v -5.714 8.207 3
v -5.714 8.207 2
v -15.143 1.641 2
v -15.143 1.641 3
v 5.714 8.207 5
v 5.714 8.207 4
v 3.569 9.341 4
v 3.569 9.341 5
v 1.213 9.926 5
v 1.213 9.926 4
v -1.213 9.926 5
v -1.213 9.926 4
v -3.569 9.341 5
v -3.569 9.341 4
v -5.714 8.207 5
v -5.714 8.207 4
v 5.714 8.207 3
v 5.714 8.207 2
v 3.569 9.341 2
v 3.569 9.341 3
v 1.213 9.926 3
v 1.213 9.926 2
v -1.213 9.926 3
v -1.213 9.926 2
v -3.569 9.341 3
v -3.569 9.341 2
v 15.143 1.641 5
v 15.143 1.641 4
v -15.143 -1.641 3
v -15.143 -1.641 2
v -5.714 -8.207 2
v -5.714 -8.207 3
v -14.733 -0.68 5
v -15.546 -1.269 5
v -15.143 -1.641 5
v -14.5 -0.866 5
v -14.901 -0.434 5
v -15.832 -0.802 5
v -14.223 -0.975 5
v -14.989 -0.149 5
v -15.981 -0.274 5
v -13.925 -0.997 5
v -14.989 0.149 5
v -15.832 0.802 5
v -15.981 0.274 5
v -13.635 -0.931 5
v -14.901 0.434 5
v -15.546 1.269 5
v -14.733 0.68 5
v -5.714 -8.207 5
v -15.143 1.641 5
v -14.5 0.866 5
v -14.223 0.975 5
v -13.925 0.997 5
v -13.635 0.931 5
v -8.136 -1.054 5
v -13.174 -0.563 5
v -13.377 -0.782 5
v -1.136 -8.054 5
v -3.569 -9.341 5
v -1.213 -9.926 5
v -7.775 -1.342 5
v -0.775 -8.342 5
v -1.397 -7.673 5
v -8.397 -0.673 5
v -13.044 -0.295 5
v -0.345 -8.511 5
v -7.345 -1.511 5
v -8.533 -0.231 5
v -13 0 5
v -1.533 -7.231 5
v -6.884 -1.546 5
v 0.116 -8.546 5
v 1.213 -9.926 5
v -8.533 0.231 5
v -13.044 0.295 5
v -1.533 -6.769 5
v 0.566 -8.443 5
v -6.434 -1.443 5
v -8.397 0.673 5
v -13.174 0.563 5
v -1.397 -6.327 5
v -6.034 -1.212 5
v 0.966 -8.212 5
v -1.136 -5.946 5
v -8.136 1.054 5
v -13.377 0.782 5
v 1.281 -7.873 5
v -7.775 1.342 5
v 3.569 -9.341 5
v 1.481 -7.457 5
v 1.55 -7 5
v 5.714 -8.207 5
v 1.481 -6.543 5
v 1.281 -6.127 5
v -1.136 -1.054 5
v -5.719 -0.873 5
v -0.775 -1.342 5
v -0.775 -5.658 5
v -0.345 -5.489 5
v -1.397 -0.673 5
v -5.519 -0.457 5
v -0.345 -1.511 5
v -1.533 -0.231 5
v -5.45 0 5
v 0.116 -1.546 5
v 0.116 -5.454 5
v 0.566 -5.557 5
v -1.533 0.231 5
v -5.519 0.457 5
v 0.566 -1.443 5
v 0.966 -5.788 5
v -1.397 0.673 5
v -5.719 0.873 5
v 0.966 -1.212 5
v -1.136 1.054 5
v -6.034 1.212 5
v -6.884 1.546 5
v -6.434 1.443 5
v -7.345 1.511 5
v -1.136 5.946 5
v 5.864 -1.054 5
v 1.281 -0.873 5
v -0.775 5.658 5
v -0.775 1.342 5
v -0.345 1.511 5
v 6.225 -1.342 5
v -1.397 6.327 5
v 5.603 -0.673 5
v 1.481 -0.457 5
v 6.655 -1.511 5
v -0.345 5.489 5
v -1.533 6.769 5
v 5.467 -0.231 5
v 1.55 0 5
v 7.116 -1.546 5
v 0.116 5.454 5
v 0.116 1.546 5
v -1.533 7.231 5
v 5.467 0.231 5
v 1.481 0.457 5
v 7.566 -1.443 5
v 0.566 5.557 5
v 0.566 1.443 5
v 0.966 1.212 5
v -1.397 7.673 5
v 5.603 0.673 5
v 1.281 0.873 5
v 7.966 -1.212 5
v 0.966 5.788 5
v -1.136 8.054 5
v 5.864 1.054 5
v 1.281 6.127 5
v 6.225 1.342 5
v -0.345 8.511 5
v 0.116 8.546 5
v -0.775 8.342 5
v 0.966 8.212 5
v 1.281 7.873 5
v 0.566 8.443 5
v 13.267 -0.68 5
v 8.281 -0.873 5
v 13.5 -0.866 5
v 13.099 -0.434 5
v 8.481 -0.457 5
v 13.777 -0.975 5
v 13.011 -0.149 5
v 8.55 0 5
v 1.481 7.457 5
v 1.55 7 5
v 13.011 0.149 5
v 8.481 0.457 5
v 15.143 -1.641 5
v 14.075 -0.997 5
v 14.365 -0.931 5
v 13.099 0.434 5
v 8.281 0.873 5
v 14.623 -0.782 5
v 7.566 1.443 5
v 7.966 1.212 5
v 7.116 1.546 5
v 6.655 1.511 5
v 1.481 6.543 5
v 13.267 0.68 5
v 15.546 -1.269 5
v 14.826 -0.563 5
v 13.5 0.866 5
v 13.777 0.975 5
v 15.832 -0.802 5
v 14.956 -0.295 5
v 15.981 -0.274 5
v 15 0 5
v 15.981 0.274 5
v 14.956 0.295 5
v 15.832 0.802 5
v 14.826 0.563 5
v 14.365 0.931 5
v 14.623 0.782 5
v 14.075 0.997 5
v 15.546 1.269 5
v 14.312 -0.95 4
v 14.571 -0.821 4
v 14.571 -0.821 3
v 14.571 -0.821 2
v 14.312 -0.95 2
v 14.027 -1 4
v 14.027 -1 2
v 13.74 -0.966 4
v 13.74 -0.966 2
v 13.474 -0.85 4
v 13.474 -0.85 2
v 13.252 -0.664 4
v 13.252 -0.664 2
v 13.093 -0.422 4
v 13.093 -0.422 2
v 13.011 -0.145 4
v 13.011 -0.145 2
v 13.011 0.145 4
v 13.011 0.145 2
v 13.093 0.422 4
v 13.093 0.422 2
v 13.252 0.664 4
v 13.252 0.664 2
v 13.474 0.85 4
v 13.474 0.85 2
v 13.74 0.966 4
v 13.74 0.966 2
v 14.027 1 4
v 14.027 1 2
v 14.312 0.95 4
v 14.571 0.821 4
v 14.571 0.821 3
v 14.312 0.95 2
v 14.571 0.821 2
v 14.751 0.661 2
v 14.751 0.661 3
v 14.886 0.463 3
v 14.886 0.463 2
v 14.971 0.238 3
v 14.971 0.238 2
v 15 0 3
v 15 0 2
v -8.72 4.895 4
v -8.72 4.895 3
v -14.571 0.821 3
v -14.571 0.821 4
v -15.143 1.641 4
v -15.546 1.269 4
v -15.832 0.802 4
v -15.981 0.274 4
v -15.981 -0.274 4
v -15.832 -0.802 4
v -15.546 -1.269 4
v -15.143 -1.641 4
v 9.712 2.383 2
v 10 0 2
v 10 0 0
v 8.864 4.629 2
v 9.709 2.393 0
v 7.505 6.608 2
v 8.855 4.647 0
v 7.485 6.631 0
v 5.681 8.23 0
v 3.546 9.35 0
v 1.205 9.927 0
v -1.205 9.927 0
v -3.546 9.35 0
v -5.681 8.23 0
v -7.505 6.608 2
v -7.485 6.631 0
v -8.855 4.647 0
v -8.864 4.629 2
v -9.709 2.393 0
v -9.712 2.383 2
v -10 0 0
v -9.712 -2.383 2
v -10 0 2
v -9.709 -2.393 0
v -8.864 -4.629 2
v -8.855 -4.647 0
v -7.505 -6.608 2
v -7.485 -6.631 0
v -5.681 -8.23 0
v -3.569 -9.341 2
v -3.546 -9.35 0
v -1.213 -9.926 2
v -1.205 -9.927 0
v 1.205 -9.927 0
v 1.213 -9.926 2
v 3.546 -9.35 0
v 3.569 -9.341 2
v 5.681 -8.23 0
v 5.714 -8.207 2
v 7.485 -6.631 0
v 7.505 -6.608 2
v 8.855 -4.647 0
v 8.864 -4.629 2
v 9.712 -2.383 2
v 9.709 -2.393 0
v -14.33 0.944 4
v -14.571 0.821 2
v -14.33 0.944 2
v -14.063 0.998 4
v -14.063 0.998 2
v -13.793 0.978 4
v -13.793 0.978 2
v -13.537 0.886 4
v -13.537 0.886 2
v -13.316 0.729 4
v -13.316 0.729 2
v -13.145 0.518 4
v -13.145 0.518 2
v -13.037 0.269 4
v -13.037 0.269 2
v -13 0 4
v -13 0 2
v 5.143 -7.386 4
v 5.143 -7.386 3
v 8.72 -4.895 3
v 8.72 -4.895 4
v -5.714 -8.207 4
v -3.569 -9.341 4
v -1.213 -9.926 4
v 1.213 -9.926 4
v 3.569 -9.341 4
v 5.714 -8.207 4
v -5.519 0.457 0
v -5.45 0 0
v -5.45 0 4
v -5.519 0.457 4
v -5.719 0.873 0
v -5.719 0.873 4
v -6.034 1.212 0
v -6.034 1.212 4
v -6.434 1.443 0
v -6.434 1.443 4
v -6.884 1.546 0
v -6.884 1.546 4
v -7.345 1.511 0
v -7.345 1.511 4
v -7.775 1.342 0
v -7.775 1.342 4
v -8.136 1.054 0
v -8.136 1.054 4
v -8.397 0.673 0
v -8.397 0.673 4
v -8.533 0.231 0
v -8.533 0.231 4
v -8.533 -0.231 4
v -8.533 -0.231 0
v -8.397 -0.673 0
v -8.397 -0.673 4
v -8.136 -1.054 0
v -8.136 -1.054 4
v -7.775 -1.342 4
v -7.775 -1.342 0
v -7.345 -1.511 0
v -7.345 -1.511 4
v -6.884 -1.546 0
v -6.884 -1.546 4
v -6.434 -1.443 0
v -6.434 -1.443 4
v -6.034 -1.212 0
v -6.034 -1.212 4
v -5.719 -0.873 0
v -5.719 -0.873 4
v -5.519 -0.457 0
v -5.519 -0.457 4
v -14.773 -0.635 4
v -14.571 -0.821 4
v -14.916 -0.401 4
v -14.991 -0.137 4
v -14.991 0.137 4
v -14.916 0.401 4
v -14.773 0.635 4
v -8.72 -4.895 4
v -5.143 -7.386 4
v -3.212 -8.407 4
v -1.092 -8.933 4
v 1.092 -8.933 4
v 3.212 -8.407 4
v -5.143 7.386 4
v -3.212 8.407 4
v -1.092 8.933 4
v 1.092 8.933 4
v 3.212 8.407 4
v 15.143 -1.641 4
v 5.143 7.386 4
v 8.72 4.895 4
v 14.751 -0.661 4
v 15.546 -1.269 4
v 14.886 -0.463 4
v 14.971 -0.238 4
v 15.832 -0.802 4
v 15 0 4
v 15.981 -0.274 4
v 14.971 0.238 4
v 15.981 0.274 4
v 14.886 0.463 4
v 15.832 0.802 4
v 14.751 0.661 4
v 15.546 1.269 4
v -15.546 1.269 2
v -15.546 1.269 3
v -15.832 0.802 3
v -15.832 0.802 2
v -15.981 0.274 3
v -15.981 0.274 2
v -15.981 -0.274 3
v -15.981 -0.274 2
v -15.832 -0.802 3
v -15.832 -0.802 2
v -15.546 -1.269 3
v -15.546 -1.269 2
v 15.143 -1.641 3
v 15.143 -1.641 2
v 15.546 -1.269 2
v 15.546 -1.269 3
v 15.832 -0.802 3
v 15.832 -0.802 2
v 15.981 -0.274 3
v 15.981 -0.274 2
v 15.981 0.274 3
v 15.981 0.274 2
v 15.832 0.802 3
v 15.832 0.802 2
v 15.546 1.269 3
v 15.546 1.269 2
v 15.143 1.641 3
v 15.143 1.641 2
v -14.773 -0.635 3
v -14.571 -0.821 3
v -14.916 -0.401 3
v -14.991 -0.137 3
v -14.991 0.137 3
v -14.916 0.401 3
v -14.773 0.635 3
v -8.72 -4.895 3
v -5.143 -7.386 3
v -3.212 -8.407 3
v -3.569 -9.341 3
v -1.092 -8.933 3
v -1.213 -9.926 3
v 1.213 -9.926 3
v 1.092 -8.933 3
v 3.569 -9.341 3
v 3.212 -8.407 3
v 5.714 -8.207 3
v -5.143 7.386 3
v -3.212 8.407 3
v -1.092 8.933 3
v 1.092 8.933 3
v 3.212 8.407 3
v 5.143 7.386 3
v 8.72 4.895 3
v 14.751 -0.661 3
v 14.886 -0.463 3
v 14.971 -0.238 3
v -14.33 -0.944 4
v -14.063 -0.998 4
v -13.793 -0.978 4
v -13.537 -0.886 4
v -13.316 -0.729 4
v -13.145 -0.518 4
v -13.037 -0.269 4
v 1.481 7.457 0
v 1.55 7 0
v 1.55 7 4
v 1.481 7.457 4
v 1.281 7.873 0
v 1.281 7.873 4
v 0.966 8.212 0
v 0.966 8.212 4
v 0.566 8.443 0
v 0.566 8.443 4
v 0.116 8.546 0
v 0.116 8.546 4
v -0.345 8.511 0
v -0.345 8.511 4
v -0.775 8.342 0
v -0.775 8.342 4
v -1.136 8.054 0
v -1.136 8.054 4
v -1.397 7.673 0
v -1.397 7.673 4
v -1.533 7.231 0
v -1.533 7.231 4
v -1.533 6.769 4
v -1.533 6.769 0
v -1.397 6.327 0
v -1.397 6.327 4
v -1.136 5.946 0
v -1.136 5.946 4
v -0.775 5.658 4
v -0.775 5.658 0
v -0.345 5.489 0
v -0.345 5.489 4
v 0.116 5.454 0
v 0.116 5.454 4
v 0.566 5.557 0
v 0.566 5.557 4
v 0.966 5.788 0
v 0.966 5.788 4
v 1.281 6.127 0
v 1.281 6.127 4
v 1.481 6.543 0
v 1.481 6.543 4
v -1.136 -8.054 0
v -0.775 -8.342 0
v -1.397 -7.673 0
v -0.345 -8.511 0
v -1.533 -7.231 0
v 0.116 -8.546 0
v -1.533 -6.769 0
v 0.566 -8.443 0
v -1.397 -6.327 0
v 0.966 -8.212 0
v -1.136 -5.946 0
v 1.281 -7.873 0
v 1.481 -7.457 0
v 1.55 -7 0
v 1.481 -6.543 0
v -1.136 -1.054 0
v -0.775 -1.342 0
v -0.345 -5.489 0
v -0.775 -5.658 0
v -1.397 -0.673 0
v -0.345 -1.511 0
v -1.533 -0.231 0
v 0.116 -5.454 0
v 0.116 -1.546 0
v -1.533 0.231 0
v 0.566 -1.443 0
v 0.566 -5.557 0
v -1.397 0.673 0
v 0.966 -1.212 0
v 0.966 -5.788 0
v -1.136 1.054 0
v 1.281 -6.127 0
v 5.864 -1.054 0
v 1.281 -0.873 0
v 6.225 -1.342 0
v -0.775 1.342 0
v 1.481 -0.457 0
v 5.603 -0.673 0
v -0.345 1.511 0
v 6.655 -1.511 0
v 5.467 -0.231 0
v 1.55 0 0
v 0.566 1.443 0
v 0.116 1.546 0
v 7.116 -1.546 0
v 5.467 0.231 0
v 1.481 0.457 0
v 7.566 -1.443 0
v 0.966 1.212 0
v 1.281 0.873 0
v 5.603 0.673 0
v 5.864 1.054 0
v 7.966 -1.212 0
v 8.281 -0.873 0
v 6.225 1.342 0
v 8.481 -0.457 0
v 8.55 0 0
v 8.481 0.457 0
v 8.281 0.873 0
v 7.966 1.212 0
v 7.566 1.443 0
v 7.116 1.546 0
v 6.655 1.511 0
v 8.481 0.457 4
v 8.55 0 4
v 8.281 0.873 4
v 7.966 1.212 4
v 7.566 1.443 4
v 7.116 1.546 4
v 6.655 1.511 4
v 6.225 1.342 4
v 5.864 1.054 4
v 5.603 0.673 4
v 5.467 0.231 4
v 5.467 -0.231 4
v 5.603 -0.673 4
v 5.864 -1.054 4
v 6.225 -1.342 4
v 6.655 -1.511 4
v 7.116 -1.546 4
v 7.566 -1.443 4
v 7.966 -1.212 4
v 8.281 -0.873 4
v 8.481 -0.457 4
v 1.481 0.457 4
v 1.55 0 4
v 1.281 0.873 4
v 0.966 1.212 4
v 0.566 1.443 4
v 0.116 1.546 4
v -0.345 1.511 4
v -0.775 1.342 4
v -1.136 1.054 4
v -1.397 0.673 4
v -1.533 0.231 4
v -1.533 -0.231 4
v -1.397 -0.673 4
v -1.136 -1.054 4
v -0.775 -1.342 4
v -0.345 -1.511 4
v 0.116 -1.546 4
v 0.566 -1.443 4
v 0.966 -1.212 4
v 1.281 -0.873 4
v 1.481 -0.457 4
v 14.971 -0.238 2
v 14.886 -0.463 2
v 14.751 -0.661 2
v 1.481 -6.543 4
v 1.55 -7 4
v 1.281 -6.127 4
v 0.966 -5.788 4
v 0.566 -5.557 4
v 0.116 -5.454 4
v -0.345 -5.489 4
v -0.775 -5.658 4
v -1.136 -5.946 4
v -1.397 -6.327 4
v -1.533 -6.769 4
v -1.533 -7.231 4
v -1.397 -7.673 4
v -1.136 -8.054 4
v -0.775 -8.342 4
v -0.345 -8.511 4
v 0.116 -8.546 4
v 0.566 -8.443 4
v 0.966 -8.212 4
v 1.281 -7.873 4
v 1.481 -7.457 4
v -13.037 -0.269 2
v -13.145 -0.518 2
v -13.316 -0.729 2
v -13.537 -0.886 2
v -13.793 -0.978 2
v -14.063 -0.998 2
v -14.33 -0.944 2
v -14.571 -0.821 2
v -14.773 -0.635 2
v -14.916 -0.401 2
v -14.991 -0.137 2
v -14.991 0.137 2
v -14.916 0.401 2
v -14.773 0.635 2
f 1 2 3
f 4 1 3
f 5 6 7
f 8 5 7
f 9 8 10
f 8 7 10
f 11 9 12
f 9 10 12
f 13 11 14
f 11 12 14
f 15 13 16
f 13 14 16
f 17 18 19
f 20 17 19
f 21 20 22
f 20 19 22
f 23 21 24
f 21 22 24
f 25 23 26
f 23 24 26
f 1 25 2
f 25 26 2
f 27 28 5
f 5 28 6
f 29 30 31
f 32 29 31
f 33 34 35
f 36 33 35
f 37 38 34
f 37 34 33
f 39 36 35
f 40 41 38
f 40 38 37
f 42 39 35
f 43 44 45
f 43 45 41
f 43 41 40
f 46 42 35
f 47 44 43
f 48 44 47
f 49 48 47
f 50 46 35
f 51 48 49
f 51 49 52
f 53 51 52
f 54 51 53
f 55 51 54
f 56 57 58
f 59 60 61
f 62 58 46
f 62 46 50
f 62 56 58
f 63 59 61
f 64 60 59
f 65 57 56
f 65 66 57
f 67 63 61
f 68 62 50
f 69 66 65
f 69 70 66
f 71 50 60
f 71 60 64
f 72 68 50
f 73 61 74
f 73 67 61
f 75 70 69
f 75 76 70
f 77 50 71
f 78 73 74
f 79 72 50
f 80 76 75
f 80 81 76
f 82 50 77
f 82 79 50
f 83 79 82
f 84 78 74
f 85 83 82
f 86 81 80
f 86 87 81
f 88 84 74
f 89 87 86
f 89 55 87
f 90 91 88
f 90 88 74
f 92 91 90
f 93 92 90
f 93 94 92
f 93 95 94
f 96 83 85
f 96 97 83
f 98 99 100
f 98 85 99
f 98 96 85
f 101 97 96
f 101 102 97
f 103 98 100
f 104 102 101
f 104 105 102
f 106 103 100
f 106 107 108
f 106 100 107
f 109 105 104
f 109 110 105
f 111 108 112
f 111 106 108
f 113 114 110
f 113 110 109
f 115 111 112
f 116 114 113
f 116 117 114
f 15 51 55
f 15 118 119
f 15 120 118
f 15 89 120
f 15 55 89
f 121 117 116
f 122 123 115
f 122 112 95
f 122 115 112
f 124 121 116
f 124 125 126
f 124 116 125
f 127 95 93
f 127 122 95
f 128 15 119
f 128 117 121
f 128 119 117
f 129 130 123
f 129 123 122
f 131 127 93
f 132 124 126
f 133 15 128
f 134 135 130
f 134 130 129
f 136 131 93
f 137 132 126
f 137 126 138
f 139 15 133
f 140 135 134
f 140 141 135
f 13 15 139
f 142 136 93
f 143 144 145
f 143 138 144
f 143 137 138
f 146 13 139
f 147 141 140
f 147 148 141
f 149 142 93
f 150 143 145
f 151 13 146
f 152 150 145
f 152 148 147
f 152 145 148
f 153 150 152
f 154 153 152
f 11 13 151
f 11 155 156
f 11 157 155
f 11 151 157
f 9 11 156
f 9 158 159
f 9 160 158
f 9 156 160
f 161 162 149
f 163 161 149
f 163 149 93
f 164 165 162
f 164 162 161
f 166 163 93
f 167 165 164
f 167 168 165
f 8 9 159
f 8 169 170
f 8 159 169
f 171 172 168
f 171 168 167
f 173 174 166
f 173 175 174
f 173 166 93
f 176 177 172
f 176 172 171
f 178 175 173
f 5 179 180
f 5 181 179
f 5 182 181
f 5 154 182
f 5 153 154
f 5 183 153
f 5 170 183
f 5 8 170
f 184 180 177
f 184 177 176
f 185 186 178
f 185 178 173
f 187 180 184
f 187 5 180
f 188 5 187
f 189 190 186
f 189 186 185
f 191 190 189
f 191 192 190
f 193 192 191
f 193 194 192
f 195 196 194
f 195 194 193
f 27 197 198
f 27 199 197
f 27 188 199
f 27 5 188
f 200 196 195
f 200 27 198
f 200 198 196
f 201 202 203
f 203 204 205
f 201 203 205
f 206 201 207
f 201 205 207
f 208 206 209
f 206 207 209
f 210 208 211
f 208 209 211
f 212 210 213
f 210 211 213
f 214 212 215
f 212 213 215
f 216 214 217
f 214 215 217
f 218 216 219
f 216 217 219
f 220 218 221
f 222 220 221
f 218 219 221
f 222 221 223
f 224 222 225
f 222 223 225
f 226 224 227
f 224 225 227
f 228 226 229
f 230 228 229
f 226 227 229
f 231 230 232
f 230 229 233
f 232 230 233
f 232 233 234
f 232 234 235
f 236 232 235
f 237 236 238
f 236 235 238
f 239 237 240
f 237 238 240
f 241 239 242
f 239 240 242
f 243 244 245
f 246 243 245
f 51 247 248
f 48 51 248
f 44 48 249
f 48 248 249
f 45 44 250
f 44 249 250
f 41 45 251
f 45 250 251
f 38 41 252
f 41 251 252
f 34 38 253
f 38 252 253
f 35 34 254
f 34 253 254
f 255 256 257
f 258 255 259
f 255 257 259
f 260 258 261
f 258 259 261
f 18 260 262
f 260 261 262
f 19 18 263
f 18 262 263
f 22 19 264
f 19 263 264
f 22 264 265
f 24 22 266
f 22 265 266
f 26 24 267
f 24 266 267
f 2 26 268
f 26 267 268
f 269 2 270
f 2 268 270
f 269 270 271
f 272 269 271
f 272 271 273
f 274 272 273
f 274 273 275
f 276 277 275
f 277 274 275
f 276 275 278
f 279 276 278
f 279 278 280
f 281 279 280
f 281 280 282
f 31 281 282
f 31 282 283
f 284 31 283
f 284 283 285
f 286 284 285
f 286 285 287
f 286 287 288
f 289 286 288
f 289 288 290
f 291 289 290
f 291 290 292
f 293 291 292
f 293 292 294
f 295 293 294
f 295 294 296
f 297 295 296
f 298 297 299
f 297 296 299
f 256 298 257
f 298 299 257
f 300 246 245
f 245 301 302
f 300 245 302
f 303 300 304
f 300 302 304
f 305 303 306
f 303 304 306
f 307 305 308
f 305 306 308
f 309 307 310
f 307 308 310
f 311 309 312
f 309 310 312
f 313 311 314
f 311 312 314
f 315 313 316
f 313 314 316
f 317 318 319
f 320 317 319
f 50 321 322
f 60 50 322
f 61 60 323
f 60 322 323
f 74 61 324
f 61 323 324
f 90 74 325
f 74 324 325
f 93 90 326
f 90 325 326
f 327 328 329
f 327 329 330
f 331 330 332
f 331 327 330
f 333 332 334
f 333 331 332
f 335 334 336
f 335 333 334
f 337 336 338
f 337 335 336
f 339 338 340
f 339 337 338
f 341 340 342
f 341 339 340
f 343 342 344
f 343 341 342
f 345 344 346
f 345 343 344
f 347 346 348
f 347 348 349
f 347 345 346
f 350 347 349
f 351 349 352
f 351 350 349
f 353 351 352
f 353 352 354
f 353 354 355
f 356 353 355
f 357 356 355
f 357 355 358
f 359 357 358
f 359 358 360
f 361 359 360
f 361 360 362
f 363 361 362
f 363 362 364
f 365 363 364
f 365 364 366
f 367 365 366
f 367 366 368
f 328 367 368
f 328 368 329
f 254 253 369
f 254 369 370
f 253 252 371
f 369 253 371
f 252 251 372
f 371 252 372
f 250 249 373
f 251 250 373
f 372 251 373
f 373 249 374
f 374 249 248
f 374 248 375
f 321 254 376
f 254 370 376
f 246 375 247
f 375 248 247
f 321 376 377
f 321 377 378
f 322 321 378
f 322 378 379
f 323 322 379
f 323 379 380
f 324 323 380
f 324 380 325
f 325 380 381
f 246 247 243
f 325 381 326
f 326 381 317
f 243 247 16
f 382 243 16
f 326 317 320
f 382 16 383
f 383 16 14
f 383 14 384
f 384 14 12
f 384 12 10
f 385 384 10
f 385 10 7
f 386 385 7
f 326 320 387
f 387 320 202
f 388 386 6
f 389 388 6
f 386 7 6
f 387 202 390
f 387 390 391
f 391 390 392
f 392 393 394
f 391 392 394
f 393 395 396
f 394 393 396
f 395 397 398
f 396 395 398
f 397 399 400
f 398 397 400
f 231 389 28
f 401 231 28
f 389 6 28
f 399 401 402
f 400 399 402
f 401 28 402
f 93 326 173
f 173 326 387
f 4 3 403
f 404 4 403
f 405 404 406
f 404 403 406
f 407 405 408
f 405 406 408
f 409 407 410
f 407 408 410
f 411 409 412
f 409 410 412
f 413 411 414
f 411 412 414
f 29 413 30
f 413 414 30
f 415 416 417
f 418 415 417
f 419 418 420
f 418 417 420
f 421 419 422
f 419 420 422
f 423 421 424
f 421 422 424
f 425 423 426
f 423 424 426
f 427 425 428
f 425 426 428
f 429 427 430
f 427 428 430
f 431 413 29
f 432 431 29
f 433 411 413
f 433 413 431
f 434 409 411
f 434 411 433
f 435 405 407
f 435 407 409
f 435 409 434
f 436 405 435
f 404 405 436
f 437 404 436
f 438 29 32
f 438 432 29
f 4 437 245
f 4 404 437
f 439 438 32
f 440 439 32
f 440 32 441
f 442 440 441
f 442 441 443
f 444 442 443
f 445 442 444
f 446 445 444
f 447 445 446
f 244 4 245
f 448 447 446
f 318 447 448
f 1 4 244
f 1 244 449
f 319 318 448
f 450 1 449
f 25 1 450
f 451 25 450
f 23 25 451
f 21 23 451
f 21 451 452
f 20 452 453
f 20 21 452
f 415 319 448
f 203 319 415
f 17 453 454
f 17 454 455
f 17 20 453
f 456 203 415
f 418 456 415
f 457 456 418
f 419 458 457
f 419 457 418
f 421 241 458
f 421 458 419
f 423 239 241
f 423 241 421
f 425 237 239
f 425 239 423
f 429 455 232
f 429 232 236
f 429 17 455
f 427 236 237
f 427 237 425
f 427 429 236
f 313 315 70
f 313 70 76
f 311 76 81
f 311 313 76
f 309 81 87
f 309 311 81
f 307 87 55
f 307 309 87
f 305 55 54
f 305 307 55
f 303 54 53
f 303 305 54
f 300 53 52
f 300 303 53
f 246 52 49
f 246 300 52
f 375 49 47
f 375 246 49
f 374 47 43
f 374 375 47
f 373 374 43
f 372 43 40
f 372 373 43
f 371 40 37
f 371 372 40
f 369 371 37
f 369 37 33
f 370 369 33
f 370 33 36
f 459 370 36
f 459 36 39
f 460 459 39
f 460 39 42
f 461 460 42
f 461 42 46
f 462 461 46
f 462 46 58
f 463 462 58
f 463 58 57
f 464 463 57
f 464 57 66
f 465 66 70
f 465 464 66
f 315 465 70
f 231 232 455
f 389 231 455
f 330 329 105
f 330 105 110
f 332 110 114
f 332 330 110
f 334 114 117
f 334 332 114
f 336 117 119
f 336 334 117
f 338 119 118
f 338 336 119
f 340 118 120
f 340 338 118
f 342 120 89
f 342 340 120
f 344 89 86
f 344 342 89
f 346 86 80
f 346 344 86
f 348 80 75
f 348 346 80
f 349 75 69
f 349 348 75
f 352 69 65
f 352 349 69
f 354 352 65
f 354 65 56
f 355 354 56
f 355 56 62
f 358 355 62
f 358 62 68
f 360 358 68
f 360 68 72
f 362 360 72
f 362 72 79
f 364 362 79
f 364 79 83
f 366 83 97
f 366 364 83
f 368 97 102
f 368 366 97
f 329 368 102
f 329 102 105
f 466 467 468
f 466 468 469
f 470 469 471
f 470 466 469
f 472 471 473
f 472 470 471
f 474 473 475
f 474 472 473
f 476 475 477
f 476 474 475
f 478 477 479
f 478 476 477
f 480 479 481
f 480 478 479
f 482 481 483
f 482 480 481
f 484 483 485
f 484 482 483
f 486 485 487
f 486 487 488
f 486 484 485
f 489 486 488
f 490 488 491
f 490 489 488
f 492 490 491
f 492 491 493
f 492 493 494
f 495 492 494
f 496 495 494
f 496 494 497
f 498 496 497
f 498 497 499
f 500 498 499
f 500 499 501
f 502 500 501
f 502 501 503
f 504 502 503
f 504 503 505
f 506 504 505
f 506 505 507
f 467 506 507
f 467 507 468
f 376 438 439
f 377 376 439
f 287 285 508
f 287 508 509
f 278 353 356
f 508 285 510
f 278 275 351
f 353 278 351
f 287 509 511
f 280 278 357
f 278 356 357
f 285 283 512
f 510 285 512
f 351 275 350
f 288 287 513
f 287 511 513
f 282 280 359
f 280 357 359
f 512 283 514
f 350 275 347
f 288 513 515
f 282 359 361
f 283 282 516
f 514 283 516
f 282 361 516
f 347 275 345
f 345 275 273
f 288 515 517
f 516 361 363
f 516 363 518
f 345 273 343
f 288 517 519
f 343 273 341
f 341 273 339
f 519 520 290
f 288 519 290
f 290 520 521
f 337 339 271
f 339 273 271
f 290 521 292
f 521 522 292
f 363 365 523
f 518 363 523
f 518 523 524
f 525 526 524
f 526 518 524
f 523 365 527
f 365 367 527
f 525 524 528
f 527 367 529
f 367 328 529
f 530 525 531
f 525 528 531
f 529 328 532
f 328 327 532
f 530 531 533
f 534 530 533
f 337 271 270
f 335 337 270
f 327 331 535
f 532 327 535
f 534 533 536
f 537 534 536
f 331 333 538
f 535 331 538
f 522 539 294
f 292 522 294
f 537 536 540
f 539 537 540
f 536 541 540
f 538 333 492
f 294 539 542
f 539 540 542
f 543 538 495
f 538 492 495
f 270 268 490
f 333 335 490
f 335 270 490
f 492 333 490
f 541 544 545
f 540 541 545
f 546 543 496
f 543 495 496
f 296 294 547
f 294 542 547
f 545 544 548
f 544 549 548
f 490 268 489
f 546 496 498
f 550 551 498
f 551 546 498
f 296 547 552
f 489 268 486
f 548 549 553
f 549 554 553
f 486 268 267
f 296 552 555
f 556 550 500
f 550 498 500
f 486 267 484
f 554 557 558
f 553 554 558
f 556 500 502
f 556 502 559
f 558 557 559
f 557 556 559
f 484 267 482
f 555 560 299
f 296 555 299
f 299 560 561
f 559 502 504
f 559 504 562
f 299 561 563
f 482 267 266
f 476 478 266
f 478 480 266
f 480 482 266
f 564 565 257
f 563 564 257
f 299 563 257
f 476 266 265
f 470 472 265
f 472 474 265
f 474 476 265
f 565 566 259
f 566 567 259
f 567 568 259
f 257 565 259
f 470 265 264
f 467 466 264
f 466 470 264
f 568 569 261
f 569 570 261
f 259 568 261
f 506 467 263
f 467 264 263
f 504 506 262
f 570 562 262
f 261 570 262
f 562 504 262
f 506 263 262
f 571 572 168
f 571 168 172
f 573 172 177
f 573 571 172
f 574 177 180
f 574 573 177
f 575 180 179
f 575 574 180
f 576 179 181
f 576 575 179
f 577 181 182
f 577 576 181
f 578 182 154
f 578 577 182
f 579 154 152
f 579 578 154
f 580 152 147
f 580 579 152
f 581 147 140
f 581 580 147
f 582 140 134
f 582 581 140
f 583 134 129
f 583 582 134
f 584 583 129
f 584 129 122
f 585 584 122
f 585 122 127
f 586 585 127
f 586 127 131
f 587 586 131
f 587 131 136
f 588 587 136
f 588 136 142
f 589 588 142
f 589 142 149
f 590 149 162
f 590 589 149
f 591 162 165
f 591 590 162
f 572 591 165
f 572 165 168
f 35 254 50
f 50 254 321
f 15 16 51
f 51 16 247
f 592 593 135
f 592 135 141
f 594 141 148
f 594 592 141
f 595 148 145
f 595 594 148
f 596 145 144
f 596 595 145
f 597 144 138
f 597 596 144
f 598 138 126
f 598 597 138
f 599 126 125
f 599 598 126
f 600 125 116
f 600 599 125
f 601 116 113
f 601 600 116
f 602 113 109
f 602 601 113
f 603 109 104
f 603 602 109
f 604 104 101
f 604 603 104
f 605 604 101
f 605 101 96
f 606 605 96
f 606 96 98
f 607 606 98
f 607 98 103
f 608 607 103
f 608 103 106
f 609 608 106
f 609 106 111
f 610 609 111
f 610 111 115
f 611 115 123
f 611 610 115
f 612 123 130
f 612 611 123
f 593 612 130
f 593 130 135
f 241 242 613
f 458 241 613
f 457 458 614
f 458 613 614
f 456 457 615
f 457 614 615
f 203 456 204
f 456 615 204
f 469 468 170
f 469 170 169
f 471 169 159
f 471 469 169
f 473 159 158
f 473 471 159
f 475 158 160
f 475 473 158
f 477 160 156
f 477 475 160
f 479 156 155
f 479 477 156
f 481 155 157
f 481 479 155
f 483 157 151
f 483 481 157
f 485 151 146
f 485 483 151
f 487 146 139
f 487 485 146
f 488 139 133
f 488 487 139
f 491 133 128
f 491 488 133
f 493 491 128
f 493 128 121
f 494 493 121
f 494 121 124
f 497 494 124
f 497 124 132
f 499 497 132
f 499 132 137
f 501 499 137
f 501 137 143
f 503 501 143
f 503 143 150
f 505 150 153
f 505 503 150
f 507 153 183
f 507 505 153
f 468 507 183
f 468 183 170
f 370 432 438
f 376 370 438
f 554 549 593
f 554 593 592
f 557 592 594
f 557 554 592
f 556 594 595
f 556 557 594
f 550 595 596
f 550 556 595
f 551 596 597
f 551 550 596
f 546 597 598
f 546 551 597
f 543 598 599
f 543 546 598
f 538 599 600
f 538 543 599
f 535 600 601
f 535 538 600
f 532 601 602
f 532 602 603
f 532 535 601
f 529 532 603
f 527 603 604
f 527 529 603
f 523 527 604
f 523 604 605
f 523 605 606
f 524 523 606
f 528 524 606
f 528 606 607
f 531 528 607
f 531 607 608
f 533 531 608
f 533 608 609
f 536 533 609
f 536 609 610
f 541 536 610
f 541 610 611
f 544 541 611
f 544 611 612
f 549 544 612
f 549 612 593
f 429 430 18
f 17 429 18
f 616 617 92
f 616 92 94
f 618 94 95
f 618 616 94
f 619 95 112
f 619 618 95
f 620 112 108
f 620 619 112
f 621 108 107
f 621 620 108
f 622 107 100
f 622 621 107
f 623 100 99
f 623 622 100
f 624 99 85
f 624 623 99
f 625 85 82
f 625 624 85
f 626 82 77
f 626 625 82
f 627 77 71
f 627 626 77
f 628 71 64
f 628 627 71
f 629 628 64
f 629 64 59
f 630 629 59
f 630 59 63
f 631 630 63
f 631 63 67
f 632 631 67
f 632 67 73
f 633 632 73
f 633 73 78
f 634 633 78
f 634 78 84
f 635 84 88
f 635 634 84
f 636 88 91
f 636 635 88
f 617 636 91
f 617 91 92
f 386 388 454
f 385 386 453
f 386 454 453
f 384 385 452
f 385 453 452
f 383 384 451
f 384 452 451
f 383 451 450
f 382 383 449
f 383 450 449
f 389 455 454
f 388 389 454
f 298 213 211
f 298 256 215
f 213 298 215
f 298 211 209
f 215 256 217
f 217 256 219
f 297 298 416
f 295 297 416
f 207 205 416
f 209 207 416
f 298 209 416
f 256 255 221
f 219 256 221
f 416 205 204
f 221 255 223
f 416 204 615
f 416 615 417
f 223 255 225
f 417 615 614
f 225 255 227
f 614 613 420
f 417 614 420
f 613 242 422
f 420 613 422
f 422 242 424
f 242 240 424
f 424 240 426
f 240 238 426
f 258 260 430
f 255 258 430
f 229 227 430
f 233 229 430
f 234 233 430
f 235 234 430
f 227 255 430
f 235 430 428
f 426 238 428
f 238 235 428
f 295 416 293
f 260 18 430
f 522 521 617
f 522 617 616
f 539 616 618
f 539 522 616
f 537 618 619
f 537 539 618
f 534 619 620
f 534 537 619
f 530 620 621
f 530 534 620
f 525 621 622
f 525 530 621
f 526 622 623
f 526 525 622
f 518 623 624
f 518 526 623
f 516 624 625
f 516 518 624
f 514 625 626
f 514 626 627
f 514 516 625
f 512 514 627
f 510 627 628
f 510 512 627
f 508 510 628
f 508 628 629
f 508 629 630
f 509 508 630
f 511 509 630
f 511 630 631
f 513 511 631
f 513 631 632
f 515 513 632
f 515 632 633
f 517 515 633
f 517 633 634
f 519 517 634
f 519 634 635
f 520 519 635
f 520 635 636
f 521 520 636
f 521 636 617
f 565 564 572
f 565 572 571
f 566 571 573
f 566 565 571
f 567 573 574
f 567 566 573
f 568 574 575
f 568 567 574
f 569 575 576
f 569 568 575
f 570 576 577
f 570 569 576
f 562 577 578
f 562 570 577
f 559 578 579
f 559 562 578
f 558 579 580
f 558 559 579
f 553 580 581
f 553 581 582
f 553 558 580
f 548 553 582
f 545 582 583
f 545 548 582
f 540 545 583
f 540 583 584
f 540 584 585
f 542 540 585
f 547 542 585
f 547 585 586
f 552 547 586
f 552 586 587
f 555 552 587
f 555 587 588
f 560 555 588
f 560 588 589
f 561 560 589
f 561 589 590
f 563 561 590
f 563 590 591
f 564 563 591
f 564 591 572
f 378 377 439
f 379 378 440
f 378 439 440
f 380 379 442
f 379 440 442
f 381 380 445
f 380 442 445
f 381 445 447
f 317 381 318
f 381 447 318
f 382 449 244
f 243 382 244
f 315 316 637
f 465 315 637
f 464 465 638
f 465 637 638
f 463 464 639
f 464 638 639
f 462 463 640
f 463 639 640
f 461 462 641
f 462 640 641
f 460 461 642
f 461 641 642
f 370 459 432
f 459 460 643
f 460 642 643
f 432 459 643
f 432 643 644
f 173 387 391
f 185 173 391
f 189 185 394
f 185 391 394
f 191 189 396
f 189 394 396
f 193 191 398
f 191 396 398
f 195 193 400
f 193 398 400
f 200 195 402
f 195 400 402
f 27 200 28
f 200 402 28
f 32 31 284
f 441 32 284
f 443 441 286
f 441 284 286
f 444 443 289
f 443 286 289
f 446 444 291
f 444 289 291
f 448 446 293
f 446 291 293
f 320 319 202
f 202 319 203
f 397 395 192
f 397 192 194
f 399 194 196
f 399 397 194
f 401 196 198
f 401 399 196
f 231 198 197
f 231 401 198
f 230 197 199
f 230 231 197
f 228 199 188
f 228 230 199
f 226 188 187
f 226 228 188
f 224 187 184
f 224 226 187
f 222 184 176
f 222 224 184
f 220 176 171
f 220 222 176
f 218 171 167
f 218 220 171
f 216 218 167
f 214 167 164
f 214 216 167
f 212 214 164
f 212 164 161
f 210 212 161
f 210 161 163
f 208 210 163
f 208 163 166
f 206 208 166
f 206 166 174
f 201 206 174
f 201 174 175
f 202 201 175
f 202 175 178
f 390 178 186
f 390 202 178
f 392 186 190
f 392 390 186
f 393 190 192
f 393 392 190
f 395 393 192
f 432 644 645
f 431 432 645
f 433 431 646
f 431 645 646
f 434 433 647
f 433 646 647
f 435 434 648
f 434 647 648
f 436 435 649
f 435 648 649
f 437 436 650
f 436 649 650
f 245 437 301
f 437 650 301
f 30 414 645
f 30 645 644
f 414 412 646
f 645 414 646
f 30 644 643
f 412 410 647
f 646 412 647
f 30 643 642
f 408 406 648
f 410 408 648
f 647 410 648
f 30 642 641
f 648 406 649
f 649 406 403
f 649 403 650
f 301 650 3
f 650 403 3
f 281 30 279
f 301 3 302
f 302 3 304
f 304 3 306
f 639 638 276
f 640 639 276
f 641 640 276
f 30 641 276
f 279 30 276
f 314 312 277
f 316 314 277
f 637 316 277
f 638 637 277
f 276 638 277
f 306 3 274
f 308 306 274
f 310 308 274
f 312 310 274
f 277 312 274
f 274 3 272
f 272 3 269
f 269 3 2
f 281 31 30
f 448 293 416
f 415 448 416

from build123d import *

# Parameters (mm, degrees)
SKETCH_1_R      = 10
SKETCH_1_R_2    = 1.55
EXTRUDE_1_DEPTH = 2
SKETCH_2_R      = 1
SKETCH_2_R_2    = 1.55
EXTRUDE_2_DEPTH = 1
SKETCH_2_3_R    = 1.55
EXTRUDE_3_DEPTH = 2
SKETCH_3_R      = 1.55
SKETCH_3_R_2    = 1
EXTRUDE_5_DEPTH = 1


with BuildPart() as part:
    # 草图1 → 凸台-拉伸1 (new body)
    with BuildSketch(Plane.XY):
        Circle(SKETCH_1_R)
        Circle(SKETCH_1_R_2, mode=Mode.SUBTRACT)
        with Locations((-7, 0)):
            Circle(SKETCH_1_R_2, mode=Mode.SUBTRACT)
        with Locations((0, 7)):
            Circle(SKETCH_1_R_2, mode=Mode.SUBTRACT)
        with Locations((7, 0)):
            Circle(SKETCH_1_R_2, mode=Mode.SUBTRACT)
        with Locations((0, -7)):
            Circle(SKETCH_1_R_2, mode=Mode.SUBTRACT)
    extrude(amount=EXTRUDE_1_DEPTH)

    # 草图2 → 凸台-拉伸2 (add)
    with BuildSketch(Plane.XY.offset(2)):
        with BuildLine():
            Line((-15.142857143, -1.641303613), (-5.714285714, -8.206518066))
            ThreePointArc((-5.714285714, -8.206518066), (0, -10), (5.714285714, -8.206518066))
            Line((5.714285714, -8.206518066), (15.142857143, -1.641303613))
            ThreePointArc((15.142857143, -1.641303613), (16, 0), (15.142857143, 1.641303613))
            Line((15.142857143, 1.641303613), (5.714285714, 8.206518066))
            ThreePointArc((5.714285714, 8.206518066), (0, 10), (-5.714285714, 8.206518066))
            Line((-5.714285714, 8.206518066), (-15.142857143, 1.641303613))
            ThreePointArc((-15.142857143, 1.641303613), (-16, 0), (-15.142857143, -1.641303613))
        make_face()
        with Locations((-14, 0)):
            Circle(SKETCH_2_R, mode=Mode.SUBTRACT)
        with Locations((14, 0)):
            Circle(SKETCH_2_R, mode=Mode.SUBTRACT)
        Circle(SKETCH_2_R_2, mode=Mode.SUBTRACT)
        with Locations((7, 0)):
            Circle(SKETCH_2_R_2, mode=Mode.SUBTRACT)
        with Locations((0, 7)):
            Circle(SKETCH_2_R_2, mode=Mode.SUBTRACT)
        with Locations((0, -7)):
            Circle(SKETCH_2_R_2, mode=Mode.SUBTRACT)
        with Locations((-7, 0)):
            Circle(SKETCH_2_R_2, mode=Mode.SUBTRACT)
    extrude(amount=EXTRUDE_2_DEPTH)

    # 草图2<3> → 凸台-拉伸3 (add)
    with BuildSketch(Plane.XY.offset(2)):
        with BuildLine():
            Line((-14.571428571, -0.820651807), (-5.142857143, -7.38586626))
            ThreePointArc((-5.142857143, -7.38586626), (0, -9), (5.142857143, -7.38586626))
            Line((5.142857143, -7.38586626), (14.571428571, -0.820651807))
            ThreePointArc((14.571428571, -0.820651807), (13, 0), (14.571428571, 0.820651807))
            Line((14.571428571, 0.820651807), (5.142857143, 7.38586626))
            ThreePointArc((5.142857143, 7.38586626), (0, 9), (-5.142857143, 7.38586626))
            Line((-5.142857143, 7.38586626), (-14.571428571, 0.820651807))
            ThreePointArc((-14.571428571, 0.820651807), (-13, 0), (-14.571428571, -0.820651807))
        make_face()
        with Locations((0, 7)):
            Circle(SKETCH_2_3_R, mode=Mode.SUBTRACT)
        with Locations((0, -7)):
            Circle(SKETCH_2_3_R, mode=Mode.SUBTRACT)
        with Locations((-7, 0)):
            Circle(SKETCH_2_3_R, mode=Mode.SUBTRACT)
        Circle(SKETCH_2_3_R, mode=Mode.SUBTRACT)
        with Locations((7, 0)):
            Circle(SKETCH_2_3_R, mode=Mode.SUBTRACT)
    extrude(amount=EXTRUDE_3_DEPTH)

    # 草图3 → 凸台-拉伸5 (add)
    with BuildSketch(Plane.XY.offset(4)):
        with BuildLine():
            Line((15.142857143, 1.641303613), (5.714285714, 8.206518066))
            ThreePointArc((5.714285714, 8.206518066), (0, 10), (-5.714285714, 8.206518066))
            Line((-5.714285714, 8.206518066), (-15.142857143, 1.641303613))
            ThreePointArc((-15.142857143, 1.641303613), (-16, 0), (-15.142857143, -1.641303613))
            Line((-15.142857143, -1.641303613), (-5.714285714, -8.206518066))
            ThreePointArc((-5.714285714, -8.206518066), (0, -10), (5.714285714, -8.206518066))
            Line((5.714285714, -8.206518066), (15.142857143, -1.641303613))
            ThreePointArc((15.142857143, -1.641303613), (16, 0), (15.142857143, 1.641303613))
        make_face()
        with Locations((0, 7)):
            Circle(SKETCH_3_R, mode=Mode.SUBTRACT)
        with Locations((7, 0)):
            Circle(SKETCH_3_R, mode=Mode.SUBTRACT)
        with Locations((0, -7)):
            Circle(SKETCH_3_R, mode=Mode.SUBTRACT)
        Circle(SKETCH_3_R, mode=Mode.SUBTRACT)
        with Locations((-7, 0)):
            Circle(SKETCH_3_R, mode=Mode.SUBTRACT)
        with Locations((-14, 0)):
            Circle(SKETCH_3_R_2, mode=Mode.SUBTRACT)
        with Locations((14, 0)):
            Circle(SKETCH_3_R_2, mode=Mode.SUBTRACT)
    extrude(amount=EXTRUDE_5_DEPTH)


solid = part.part
